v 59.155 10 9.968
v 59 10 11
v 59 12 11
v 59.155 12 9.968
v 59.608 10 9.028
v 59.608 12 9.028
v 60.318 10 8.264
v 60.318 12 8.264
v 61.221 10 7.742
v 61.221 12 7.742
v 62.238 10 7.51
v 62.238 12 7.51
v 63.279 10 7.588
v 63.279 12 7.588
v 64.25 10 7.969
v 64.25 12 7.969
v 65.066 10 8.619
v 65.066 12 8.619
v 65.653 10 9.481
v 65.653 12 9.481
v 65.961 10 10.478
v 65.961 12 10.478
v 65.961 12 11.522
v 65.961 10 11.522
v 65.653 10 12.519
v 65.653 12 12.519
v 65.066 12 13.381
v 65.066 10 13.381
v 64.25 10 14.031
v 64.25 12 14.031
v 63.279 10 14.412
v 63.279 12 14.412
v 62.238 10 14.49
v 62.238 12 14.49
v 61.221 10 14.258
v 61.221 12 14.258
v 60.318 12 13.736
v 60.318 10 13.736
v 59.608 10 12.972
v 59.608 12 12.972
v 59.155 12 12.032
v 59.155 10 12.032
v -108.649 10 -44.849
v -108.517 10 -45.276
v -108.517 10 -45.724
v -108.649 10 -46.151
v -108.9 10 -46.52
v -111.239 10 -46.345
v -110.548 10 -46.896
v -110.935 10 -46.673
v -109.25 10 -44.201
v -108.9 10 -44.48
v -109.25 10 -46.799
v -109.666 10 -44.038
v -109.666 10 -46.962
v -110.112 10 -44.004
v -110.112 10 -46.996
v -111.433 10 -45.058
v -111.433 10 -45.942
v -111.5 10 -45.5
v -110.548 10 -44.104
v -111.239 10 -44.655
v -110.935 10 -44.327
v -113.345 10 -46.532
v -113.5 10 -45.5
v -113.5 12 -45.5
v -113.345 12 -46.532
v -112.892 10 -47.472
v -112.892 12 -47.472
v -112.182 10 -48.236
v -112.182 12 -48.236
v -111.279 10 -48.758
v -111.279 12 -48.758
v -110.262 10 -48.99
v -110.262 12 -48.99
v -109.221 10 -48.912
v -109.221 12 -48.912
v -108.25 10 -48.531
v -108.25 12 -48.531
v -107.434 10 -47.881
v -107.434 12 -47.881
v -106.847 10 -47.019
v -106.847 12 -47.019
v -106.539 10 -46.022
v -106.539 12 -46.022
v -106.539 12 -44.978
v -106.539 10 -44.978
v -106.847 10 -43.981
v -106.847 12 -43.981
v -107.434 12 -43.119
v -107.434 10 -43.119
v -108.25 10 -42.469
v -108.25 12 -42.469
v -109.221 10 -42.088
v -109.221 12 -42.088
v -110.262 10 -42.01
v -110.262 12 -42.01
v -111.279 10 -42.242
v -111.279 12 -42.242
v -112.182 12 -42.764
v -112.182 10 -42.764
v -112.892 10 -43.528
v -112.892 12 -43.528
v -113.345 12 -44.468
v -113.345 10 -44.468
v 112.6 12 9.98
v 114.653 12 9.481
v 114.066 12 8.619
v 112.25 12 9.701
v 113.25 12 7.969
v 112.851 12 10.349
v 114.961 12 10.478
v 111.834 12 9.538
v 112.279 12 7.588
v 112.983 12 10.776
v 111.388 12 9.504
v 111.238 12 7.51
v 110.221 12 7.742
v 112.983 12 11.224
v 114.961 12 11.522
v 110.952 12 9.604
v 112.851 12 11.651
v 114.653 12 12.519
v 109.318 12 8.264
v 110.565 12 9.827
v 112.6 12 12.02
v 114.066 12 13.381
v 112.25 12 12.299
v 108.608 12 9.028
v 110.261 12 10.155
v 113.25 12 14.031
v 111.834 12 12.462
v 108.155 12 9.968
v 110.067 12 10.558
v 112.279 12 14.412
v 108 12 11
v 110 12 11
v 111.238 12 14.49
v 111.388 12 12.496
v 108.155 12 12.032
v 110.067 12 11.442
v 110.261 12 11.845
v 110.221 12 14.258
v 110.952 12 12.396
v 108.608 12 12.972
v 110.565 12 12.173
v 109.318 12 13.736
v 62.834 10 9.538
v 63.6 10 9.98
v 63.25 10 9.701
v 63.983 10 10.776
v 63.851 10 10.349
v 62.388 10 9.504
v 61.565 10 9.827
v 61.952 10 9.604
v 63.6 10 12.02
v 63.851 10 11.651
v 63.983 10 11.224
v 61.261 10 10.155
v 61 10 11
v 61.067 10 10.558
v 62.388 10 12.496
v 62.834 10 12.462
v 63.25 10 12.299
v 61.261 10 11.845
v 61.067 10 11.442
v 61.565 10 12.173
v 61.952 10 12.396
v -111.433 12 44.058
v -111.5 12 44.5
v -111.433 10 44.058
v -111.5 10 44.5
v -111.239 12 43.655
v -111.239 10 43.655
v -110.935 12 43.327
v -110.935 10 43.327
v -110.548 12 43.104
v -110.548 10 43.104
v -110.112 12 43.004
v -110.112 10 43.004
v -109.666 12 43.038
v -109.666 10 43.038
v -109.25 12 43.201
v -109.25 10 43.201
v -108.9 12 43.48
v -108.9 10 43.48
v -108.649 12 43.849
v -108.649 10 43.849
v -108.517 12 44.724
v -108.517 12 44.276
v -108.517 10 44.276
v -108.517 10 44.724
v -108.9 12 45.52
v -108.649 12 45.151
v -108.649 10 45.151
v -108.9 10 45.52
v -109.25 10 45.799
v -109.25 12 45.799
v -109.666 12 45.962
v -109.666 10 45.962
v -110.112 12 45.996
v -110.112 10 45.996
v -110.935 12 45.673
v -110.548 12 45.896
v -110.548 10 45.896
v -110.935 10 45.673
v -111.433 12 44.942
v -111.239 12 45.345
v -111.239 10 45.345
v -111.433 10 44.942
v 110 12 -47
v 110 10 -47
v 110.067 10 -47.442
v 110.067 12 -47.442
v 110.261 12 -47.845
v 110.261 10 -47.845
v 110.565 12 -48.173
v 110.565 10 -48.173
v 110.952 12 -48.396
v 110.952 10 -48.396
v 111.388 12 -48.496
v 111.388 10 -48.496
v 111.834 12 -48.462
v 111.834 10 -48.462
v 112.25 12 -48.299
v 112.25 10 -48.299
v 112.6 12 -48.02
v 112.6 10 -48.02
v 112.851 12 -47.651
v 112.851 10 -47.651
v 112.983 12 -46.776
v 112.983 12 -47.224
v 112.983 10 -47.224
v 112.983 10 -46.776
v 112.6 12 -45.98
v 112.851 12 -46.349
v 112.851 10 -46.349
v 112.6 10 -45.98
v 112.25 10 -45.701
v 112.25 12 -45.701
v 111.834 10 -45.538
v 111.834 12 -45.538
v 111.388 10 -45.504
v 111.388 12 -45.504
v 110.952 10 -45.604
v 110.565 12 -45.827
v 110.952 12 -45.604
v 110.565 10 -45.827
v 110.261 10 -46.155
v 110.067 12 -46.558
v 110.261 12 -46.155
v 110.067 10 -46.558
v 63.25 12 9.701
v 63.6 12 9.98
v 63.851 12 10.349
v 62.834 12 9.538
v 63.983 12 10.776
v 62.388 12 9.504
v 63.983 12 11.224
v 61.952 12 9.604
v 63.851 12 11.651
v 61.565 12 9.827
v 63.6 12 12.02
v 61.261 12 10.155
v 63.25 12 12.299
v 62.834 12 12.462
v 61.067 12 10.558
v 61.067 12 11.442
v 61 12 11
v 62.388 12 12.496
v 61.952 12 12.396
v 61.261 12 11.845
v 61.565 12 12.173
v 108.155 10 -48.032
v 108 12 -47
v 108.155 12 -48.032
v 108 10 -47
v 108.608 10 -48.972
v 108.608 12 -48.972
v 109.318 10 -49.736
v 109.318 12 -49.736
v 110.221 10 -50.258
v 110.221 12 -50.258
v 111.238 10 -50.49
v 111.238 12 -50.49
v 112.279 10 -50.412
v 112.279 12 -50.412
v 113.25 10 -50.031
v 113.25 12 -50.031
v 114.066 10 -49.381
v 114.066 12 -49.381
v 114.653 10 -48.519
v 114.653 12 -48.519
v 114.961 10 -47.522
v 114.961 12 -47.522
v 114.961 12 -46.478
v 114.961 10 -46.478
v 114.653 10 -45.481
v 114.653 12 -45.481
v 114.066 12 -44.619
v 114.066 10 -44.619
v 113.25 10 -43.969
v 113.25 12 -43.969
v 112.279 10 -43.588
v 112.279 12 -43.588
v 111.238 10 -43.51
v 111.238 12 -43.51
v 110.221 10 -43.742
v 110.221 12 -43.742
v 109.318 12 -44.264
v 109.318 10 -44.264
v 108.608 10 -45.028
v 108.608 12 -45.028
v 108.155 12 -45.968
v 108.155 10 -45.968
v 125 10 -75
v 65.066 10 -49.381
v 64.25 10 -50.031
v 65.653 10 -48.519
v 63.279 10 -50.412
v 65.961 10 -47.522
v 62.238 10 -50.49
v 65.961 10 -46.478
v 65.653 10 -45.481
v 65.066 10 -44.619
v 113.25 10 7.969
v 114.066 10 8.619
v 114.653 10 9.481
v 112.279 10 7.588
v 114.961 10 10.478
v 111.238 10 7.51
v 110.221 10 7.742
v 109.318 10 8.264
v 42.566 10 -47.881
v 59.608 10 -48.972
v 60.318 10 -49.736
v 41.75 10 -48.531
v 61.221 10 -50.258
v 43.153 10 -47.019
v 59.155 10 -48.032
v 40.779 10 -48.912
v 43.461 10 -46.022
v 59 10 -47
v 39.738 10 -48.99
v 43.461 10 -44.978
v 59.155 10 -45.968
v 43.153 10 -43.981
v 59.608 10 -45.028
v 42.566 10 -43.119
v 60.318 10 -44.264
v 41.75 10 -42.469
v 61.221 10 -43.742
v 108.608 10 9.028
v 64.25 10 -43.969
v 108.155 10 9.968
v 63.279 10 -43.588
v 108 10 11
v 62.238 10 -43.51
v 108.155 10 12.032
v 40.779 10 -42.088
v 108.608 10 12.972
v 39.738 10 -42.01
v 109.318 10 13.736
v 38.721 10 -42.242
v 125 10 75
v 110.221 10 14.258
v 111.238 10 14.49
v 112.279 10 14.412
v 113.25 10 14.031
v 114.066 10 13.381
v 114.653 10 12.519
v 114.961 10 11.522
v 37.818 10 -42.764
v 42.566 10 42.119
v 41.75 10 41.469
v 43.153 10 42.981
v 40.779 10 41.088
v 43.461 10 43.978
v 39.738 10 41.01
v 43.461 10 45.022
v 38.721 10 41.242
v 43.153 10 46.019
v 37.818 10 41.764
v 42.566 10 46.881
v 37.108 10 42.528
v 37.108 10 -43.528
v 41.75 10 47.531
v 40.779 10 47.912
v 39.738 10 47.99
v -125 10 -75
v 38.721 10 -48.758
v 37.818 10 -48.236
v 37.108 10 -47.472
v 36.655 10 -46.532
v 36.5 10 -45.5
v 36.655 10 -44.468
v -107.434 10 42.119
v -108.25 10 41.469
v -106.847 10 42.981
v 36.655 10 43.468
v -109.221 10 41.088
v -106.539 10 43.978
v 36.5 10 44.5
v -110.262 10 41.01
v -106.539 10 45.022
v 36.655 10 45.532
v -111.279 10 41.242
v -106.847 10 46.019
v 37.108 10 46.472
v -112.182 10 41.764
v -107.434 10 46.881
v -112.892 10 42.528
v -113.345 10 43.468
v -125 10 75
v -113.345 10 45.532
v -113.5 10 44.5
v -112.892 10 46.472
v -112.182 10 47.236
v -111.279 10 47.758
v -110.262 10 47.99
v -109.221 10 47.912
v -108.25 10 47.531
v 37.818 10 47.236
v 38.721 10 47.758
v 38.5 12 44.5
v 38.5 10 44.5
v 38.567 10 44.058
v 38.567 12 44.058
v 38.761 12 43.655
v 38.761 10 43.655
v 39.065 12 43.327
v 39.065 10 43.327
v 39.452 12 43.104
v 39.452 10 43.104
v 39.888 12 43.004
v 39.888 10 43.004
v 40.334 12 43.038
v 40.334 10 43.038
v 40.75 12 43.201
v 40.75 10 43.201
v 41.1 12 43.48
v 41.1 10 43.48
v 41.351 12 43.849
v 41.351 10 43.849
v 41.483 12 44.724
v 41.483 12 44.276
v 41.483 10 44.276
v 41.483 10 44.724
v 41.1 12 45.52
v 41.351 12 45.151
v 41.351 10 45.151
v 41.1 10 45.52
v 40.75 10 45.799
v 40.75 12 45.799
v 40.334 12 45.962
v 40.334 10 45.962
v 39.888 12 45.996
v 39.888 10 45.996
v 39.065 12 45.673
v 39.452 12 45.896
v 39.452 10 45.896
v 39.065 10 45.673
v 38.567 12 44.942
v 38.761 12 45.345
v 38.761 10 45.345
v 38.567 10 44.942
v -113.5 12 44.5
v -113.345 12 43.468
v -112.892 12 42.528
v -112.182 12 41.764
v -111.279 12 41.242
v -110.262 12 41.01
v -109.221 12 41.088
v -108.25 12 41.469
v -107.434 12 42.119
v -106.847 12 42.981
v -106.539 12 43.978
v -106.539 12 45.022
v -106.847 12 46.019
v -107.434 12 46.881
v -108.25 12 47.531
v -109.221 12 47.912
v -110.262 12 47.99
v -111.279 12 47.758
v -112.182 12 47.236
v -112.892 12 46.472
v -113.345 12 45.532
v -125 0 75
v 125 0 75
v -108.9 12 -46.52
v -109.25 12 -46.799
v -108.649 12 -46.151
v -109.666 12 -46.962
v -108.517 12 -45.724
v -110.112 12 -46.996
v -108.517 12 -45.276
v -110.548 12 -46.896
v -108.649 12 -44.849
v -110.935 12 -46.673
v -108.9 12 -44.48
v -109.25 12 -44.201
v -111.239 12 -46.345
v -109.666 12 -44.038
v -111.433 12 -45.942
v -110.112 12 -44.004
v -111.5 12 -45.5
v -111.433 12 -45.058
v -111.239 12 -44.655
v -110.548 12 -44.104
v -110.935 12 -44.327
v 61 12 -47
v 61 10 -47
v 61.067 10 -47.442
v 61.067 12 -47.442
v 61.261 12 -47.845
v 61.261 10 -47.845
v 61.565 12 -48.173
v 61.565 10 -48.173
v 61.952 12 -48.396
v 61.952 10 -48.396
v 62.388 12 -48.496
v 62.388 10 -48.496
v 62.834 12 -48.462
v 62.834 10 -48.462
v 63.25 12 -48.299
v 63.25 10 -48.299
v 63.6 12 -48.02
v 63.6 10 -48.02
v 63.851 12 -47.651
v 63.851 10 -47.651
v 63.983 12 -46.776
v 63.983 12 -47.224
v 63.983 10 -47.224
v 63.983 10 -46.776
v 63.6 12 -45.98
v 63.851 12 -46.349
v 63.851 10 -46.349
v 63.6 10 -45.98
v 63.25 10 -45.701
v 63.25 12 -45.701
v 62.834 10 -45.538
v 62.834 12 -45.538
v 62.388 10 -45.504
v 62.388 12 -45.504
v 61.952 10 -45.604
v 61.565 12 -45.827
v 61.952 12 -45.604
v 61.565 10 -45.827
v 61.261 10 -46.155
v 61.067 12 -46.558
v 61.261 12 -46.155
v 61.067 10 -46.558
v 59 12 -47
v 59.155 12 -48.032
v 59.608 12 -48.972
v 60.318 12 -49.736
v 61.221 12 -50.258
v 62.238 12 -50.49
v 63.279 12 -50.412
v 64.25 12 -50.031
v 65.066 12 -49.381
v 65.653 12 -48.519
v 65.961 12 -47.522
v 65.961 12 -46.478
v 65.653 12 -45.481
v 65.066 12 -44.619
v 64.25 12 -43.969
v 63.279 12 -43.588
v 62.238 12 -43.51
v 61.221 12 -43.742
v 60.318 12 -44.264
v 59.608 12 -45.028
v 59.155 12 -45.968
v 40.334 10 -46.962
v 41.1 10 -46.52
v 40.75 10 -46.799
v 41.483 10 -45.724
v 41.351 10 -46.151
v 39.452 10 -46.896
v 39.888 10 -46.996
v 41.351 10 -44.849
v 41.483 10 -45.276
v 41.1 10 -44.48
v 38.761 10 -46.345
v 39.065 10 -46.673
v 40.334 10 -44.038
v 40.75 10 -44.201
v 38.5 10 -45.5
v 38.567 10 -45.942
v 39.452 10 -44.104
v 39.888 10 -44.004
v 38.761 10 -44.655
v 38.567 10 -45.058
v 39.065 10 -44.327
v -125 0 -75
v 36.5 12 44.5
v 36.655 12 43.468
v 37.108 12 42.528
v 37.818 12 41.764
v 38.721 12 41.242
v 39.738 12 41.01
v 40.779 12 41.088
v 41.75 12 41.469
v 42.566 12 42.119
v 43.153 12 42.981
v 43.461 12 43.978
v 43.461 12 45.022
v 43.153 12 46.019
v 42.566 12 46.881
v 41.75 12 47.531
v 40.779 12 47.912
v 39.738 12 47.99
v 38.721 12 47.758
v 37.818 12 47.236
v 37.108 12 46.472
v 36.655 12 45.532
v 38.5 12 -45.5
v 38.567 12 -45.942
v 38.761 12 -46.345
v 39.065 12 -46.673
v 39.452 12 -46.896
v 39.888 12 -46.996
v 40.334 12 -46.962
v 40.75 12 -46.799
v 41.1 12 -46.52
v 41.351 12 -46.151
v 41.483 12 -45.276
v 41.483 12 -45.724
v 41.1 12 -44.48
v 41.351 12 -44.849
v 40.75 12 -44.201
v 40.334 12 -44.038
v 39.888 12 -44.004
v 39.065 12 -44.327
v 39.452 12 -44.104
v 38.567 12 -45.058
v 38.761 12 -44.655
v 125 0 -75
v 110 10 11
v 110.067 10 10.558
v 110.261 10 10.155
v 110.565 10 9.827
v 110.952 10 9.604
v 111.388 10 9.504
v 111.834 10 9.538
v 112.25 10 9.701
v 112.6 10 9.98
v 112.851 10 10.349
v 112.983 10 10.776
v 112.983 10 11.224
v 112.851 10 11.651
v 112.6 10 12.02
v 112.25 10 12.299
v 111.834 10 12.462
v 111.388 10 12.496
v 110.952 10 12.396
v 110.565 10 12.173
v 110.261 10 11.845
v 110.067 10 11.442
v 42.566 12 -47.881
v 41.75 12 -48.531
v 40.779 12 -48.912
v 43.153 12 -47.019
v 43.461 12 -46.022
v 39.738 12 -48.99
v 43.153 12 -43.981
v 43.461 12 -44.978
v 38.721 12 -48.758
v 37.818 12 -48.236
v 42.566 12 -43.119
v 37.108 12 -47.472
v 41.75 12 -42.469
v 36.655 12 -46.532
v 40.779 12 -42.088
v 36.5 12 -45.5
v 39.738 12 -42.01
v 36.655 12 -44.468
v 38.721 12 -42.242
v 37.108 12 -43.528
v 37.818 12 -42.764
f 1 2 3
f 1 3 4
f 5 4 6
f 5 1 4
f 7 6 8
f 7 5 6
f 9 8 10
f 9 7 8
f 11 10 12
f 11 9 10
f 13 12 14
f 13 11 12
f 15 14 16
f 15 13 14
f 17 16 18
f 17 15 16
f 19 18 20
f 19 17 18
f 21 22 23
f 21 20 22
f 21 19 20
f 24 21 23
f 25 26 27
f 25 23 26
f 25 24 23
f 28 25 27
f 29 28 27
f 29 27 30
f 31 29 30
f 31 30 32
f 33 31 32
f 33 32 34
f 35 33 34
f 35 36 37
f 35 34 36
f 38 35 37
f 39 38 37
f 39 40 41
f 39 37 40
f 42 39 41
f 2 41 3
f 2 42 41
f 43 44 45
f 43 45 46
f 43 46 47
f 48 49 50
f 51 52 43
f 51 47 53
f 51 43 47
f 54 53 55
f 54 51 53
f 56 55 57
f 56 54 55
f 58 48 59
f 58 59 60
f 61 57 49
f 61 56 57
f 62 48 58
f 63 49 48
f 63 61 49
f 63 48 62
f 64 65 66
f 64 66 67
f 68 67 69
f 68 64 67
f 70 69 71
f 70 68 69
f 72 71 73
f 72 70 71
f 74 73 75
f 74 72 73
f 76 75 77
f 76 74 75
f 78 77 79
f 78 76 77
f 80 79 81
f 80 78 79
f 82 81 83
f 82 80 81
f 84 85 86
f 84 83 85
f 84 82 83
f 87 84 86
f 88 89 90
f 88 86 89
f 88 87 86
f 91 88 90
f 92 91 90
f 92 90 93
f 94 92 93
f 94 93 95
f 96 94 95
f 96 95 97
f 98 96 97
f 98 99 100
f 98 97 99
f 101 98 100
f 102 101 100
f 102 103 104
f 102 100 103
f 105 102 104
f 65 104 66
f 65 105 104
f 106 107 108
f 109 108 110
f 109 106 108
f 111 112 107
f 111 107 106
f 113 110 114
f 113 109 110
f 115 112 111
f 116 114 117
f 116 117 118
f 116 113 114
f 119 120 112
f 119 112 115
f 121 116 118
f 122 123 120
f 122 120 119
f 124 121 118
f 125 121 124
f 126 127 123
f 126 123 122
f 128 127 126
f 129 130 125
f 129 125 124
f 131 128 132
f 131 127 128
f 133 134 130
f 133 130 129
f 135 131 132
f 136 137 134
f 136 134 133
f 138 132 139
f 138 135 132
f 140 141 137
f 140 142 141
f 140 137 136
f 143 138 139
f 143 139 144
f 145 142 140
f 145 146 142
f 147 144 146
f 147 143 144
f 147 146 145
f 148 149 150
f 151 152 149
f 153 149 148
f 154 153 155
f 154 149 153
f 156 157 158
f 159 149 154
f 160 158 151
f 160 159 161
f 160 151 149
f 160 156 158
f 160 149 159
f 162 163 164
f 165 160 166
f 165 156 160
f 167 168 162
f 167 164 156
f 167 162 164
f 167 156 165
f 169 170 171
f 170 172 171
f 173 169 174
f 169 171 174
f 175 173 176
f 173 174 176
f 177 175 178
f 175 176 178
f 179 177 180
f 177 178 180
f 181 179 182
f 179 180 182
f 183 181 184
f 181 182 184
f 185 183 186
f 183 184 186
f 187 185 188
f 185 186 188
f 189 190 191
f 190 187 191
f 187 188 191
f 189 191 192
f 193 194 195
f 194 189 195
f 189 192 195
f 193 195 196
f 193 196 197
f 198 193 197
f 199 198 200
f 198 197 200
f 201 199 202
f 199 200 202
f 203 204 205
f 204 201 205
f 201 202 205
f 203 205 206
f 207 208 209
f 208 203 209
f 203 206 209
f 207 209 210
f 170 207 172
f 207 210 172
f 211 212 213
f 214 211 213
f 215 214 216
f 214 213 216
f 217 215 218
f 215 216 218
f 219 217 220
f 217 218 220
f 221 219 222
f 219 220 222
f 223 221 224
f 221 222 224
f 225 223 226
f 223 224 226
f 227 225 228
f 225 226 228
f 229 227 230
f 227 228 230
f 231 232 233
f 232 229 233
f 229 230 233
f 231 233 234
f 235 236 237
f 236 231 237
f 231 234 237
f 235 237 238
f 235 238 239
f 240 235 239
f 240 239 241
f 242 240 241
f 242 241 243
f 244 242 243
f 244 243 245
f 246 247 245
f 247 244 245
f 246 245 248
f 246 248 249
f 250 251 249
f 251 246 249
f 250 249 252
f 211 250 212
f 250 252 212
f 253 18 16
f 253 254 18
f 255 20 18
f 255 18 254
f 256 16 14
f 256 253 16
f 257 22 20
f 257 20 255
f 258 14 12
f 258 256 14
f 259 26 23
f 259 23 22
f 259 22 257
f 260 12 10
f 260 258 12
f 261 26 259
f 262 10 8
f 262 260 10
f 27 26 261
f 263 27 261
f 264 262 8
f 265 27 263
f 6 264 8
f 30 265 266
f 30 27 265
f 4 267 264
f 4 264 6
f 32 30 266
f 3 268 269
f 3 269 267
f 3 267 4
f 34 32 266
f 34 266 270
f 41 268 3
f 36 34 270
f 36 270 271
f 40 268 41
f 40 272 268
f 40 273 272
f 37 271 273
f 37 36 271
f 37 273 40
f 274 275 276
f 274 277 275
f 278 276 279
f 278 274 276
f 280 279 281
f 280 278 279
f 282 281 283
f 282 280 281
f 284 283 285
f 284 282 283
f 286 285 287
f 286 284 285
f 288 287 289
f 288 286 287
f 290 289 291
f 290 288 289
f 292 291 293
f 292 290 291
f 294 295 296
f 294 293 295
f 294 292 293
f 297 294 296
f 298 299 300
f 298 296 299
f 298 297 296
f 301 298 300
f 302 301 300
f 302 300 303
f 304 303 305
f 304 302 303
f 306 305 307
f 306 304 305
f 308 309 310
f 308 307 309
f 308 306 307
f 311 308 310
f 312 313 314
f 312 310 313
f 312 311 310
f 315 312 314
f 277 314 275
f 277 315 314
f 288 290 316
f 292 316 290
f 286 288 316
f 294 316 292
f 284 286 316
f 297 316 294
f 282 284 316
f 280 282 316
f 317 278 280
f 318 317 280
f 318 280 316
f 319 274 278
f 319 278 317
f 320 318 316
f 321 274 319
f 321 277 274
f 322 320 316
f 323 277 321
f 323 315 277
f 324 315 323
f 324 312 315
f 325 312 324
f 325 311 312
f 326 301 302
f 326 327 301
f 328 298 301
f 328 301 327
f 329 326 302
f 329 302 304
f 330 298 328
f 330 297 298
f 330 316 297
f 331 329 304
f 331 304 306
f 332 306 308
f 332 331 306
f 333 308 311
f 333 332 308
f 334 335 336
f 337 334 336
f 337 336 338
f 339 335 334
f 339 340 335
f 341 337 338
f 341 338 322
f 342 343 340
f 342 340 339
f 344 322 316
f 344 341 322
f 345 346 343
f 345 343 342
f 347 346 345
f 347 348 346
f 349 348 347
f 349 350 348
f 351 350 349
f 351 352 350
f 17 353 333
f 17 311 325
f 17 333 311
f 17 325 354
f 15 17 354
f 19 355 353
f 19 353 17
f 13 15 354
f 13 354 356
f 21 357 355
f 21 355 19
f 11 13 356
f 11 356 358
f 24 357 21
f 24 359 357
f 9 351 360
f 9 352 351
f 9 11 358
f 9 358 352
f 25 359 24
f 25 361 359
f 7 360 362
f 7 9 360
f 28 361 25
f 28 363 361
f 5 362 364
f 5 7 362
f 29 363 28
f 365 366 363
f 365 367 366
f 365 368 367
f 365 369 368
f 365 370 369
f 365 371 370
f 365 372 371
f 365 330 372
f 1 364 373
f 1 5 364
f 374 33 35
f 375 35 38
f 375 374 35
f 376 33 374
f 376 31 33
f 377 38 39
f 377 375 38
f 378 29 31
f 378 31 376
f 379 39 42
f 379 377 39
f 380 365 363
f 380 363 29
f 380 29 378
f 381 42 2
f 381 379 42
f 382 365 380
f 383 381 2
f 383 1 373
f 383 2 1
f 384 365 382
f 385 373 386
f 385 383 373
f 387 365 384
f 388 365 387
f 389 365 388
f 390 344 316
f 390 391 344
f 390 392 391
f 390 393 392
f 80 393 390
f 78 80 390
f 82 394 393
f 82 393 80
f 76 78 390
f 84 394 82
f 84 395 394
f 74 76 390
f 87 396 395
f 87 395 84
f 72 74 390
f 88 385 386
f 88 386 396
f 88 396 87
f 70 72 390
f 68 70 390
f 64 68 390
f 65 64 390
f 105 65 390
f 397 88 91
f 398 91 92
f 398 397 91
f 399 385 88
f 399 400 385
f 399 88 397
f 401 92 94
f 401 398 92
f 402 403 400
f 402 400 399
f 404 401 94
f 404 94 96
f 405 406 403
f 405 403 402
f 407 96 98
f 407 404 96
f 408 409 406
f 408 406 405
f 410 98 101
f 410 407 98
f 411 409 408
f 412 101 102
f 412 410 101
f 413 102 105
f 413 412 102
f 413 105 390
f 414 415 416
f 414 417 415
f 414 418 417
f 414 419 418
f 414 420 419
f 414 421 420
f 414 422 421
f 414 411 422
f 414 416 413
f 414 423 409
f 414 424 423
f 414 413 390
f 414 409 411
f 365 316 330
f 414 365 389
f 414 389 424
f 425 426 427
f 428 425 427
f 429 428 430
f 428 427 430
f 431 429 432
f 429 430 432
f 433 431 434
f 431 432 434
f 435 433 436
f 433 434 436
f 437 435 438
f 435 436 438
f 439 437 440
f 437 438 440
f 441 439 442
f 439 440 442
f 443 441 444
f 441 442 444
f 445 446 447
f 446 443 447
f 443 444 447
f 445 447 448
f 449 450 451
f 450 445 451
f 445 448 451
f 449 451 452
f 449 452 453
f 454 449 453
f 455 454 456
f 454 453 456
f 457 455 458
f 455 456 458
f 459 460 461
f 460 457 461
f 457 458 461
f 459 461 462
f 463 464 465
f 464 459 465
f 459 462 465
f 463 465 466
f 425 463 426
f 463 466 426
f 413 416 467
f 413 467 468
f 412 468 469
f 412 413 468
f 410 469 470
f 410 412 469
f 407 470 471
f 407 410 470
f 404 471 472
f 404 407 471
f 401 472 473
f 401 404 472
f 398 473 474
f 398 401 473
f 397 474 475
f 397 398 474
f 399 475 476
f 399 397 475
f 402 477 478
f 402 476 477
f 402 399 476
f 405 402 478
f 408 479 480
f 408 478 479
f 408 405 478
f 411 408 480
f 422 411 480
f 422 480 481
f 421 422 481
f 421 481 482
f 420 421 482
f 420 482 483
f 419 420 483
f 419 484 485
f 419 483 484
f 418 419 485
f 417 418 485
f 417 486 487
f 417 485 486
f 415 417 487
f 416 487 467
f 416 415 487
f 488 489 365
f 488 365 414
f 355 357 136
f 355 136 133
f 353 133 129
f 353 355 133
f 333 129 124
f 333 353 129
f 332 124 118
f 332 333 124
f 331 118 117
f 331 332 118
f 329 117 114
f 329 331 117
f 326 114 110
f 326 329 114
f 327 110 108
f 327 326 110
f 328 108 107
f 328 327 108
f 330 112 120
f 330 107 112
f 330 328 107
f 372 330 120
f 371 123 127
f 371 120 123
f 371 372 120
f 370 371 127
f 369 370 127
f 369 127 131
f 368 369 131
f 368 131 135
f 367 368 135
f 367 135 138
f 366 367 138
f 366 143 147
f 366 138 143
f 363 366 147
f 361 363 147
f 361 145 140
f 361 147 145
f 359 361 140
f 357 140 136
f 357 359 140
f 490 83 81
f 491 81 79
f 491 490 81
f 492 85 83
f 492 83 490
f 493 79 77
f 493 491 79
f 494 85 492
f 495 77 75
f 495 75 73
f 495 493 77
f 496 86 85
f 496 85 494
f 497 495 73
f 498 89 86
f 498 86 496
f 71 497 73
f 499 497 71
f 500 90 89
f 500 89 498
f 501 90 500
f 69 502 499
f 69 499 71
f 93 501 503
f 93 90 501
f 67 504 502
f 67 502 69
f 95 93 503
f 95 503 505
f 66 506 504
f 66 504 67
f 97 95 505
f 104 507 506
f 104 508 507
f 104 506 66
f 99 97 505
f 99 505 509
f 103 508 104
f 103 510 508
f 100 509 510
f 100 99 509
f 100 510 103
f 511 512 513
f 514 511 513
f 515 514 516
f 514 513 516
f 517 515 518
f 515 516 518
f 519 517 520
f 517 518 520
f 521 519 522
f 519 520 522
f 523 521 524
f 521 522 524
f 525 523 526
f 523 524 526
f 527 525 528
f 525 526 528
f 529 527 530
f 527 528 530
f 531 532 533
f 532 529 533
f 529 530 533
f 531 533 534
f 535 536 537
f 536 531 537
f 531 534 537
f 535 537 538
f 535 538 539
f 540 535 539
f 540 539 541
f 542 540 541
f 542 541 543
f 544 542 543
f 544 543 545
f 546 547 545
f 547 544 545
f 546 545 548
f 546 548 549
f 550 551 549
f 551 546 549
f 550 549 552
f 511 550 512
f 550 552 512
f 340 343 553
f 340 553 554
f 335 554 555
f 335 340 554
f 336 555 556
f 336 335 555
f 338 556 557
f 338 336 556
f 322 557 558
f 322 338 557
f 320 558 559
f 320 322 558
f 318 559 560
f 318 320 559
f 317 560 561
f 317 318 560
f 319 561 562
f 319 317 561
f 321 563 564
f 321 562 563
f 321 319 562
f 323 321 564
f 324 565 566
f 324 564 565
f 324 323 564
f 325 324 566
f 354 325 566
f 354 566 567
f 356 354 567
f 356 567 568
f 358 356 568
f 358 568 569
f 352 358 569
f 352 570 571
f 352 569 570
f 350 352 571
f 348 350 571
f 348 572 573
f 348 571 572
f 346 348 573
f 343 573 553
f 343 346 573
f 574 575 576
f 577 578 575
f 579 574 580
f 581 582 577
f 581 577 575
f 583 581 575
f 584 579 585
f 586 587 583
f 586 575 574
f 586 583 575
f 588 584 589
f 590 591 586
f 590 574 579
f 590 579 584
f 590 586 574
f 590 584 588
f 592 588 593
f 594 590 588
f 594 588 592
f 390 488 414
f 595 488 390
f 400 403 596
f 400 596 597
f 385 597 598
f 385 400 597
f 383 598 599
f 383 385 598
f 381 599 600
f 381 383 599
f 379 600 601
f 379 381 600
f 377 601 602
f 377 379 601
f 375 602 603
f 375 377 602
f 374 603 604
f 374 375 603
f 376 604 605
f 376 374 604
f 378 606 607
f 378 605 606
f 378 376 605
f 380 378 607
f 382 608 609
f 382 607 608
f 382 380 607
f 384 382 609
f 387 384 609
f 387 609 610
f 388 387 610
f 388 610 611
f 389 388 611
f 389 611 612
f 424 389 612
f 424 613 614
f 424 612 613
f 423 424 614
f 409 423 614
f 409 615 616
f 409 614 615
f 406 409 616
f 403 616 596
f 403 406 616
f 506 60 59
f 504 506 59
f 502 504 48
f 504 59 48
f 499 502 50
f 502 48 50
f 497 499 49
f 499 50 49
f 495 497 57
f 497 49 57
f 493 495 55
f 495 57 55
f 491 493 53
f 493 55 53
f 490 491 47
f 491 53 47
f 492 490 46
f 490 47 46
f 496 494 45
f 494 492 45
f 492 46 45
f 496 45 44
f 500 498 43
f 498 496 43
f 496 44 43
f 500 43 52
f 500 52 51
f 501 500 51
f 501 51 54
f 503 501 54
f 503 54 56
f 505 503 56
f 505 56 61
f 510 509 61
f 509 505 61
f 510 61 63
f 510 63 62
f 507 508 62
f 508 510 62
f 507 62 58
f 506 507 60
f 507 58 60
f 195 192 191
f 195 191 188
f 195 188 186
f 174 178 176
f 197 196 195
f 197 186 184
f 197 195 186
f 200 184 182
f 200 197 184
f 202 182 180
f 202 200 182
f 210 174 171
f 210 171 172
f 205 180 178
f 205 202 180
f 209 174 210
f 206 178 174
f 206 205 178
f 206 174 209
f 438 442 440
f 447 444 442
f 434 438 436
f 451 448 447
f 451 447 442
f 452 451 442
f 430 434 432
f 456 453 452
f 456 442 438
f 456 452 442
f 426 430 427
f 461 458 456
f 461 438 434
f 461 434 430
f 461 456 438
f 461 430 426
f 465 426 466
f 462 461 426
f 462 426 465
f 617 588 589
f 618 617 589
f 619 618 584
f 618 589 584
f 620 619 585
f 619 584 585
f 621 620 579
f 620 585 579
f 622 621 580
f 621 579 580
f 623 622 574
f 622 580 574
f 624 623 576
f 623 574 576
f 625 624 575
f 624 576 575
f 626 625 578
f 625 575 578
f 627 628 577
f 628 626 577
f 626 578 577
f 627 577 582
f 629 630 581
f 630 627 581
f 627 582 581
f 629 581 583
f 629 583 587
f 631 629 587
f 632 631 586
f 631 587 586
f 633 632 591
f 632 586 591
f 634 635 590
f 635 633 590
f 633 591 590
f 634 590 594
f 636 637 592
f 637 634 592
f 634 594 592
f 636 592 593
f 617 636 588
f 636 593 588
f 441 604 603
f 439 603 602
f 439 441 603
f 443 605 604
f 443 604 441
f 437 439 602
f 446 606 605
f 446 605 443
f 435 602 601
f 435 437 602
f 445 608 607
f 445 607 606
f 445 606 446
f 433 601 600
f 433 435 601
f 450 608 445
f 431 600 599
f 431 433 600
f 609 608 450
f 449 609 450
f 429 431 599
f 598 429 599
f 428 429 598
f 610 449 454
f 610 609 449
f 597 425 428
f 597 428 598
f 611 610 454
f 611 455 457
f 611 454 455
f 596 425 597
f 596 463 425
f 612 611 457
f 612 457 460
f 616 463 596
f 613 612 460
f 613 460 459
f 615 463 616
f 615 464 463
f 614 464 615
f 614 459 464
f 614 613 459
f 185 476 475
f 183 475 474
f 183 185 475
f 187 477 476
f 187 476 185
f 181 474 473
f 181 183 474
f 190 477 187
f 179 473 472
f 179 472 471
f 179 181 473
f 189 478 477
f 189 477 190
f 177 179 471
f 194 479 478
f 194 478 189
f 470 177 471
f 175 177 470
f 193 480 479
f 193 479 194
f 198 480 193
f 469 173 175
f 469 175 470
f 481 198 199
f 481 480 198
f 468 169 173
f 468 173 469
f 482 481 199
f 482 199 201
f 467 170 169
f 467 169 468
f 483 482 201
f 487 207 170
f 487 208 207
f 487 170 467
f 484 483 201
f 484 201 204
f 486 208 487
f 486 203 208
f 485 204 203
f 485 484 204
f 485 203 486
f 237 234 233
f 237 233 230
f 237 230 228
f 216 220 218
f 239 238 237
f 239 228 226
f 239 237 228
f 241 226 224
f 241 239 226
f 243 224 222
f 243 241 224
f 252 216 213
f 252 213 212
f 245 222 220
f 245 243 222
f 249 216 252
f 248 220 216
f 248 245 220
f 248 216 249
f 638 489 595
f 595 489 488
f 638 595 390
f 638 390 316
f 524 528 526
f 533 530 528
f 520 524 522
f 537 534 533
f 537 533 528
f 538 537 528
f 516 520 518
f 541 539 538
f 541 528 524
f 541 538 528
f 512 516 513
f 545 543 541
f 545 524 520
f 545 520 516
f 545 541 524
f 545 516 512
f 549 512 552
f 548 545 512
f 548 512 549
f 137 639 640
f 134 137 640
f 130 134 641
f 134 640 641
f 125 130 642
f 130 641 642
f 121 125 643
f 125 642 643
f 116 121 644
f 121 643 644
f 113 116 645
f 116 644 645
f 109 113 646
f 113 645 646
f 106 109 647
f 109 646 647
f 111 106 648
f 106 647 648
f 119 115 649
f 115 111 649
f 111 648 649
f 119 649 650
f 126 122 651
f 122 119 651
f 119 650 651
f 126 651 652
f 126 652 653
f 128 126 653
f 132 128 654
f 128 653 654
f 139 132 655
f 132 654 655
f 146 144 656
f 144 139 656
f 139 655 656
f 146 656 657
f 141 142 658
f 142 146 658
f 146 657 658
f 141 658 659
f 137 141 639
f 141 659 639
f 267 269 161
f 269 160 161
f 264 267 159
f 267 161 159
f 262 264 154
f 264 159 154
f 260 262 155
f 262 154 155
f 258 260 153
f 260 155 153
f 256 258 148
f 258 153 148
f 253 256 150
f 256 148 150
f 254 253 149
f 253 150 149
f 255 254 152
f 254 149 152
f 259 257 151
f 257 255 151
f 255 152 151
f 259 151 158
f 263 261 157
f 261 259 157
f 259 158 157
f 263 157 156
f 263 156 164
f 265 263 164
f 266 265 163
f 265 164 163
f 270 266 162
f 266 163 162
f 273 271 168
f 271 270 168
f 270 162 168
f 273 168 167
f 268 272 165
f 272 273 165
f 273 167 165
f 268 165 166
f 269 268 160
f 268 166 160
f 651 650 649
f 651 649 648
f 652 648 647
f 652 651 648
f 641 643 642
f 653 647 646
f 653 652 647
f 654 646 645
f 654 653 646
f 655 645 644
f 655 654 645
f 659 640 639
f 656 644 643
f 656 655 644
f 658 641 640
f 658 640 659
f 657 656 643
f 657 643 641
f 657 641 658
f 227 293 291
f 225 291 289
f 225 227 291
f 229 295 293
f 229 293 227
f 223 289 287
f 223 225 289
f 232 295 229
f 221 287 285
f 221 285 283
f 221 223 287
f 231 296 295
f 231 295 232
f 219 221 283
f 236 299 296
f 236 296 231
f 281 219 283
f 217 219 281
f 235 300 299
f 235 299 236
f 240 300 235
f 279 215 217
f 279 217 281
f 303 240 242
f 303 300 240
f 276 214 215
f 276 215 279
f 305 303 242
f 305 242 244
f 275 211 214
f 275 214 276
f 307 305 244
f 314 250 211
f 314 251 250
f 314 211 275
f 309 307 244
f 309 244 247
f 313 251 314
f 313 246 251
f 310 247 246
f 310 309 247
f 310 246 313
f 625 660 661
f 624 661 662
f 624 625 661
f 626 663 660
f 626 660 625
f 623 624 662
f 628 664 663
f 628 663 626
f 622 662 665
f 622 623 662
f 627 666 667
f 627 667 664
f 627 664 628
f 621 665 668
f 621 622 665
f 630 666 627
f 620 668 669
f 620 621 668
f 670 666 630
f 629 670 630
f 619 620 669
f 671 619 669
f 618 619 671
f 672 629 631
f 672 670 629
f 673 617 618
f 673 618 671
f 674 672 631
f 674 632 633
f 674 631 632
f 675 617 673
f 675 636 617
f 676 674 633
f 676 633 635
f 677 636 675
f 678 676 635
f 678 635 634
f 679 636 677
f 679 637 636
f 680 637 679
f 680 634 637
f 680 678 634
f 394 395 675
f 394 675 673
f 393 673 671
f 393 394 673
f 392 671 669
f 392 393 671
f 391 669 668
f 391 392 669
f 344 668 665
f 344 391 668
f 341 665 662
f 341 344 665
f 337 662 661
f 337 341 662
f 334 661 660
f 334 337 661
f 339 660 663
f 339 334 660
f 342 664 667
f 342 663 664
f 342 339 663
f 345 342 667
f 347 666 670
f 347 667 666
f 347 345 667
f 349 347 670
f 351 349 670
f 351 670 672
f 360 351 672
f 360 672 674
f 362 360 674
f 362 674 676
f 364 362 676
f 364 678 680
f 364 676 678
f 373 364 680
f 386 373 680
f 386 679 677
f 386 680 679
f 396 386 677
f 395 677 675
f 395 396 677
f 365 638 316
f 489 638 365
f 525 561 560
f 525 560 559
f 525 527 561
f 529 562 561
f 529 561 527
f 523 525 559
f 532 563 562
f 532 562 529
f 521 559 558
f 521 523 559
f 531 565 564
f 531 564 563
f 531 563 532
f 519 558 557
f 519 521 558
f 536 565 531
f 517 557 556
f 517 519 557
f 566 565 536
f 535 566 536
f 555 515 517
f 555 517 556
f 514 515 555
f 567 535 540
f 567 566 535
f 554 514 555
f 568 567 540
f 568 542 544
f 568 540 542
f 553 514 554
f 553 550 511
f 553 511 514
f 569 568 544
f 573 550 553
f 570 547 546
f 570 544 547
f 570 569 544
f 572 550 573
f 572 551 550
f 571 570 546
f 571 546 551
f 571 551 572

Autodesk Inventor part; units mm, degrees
ref_plane "YZ Plane" through (0, 0, 0) normal (1, 0, 0) x (0, 1, 0)
ref_plane "XZ Plane" through (0, 0, 0) normal (0, 1, 0) x (-1, 0, 0)
ref_plane "XY Plane" through (0, 0, 0) normal (0, 0, 1) x (1, 0, 0)
sketch "Sketch1" plane through (0, 0, 0) normal (0, 1, 0) x (-1, 0, 0)
  line L0 (-333.2556, -289.2611) -> (-678.6087, -289.2611) construction
  line L1 (-678.6087, -289.2611) -> (-678.6087, -95) construction
  line L2 (-678.6087, -95) -> (-333.2556, -95) construction
  line L3 (-333.2556, -95) -> (-333.2556, -289.2611) construction
  line L4 (-333.2556, -289.2611) -> (-678.6087, -95) construction
  line L5 (-488.8826, -290.1866) -> (-488.8826, -299.1866) construction
  line L6 (-488.8826, -299.1866) -> (-504.8826, -299.1866) construction
  line L7 (-488.8826, -290.1866) -> (-504.8826, -299.1866) construction
  line L8 (45, -10.5) -> (45, 9.5)
  line L9 (110, 44.5) -> (110, -45.5) construction
  circle A0 centre (110, 44.5) radius 1.5
  line L10 (115, -50.5) -> (115, 50.5) construction
  line L11 (110, -45.5) -> (-40, -45.5) construction
  line L12 (-46, -50.5) -> (115, -50.5) construction
  line L13 (115, 50.5) -> (-46, 50.5) construction
  line L14 (-40, 44.5) -> (110, 44.5) construction
  line L15 (25, -10.5) -> (45, -10.5)
  line L16 (25, 9.5) -> (25, -10.5)
  line L17 (25, -10.5) -> (45, 9.5) construction
  line L18 (45, -10.5) -> (25, 9.5) construction
  line L19 (45, 9.5) -> (25, 9.5)
  line L20 (-46, 50.5) -> (-46, -50.5) construction
  line L21 (-40, -45.5) -> (-40, 44.5) construction
  circle A1 centre (-40, 44.5) radius 1.5
  circle A2 centre (-40, -45.5) radius 1.5
  circle A3 centre (110, -45.5) radius 1.5
  line L22 (110, -45.5) -> (110, -50.5) construction
  line L23 (110, -45.5) -> (115, -45.5) construction
  line L24 (-59, -50.5) -> (-115, -50.5) construction
  line L25 (-115, -50.5) -> (-115, 34.5) construction
  line L26 (-115, 34.5) -> (-59, 34.5) construction
  line L27 (-59, 34.5) -> (-59, -50.5) construction
  line L28 (-62.5, -47) -> (-111.5, -47) construction
  line L29 (-111.5, -47) -> (-111.5, 11) construction
  line L30 (-111.5, 11) -> (-62.5, 11) construction
  line L31 (-62.5, 11) -> (-62.5, -47) construction
  circle A4 centre (-62.5, -47) radius 1.5
  circle A5 centre (-111.5, -47) radius 1.5
  circle A6 centre (-62.5, 11) radius 1.5
  circle A7 centre (-111.5, 11) radius 1.5
  line L32 (-87, -47) -> (-87, -50.5) construction
  line L33 (-125, 75) -> (125, 75)
  line L34 (125, 75) -> (125, -75)
  line L35 (125, -75) -> (-125, -75)
  line L36 (-125, -75) -> (-125, 75)
  line L37 (-125, 75) -> (125, -75) construction
  line L38 (125, 75) -> (-125, -75) construction
  line L39 (0, -57.5) -> (0, -75)
  line L40 (115, 0) -> (125, 0) construction
  circle A8 centre (110, -45.5) radius 3.5
  circle A9 centre (110, 44.5) radius 3.5
  circle A10 centre (-40, 44.5) radius 3.5
  circle A11 centre (-40, -45.5) radius 3.5
  circle A12 centre (-62.5, -47) radius 3.5
  circle A13 centre (-62.5, 11) radius 3.5
  circle A14 centre (-111.5, 11) radius 3.5
  circle A15 centre (-111.5, -47) radius 3.5
  point P0 (0, 0)
  point P1 (35, -0.5)
  dimension "d34" = 396.24
  dimension "d37" = 345.3531
  dimension "d39" = 9
  dimension "d40" = 16
  dimension "d41" = 29.358
  dimension "d42" = 29.358
  dimension "d43" = 194.2611
  dimension "d46" = 161
  dimension "d47" = 101
  dimension "d48" = 3
  dimension "d49" = 150
  dimension "d50" = 90
  dimension "d51" = 5
  dimension "d52" = 20
  dimension "d53" = 20
  dimension "d54" = 50
  dimension "d55" = 80
  dimension "d56" = 56
  dimension "d57" = 85
  dimension "d58" = 49
  dimension "d59" = 58
  dimension "d60" = 3
  dimension "d61" = 3.5
  dimension "d64" = 250
  dimension "d65" = 150
  dimension "d73" = 10
  dimension "d74" = 10
  dimension "d75" = 7
extrude "Extrusion2" add sketch "Sketch1" along normal blind 10 contours L15 L16 L19 L8 | A0 | A1 | A2 | A3 | A4 | A5 | A6 | A7 | L33 L34 L35 L36 | A8 | A9 | A10 | A11 | A12 | A13 | A14 | A15
extrude "Extrusion3" add sketch "Sketch1" along normal blind 2 from surface at 10 contours A8 | A9 | A10 | A11 | A12 | A13 | A14 | A15
properties part number "Main Mount"
